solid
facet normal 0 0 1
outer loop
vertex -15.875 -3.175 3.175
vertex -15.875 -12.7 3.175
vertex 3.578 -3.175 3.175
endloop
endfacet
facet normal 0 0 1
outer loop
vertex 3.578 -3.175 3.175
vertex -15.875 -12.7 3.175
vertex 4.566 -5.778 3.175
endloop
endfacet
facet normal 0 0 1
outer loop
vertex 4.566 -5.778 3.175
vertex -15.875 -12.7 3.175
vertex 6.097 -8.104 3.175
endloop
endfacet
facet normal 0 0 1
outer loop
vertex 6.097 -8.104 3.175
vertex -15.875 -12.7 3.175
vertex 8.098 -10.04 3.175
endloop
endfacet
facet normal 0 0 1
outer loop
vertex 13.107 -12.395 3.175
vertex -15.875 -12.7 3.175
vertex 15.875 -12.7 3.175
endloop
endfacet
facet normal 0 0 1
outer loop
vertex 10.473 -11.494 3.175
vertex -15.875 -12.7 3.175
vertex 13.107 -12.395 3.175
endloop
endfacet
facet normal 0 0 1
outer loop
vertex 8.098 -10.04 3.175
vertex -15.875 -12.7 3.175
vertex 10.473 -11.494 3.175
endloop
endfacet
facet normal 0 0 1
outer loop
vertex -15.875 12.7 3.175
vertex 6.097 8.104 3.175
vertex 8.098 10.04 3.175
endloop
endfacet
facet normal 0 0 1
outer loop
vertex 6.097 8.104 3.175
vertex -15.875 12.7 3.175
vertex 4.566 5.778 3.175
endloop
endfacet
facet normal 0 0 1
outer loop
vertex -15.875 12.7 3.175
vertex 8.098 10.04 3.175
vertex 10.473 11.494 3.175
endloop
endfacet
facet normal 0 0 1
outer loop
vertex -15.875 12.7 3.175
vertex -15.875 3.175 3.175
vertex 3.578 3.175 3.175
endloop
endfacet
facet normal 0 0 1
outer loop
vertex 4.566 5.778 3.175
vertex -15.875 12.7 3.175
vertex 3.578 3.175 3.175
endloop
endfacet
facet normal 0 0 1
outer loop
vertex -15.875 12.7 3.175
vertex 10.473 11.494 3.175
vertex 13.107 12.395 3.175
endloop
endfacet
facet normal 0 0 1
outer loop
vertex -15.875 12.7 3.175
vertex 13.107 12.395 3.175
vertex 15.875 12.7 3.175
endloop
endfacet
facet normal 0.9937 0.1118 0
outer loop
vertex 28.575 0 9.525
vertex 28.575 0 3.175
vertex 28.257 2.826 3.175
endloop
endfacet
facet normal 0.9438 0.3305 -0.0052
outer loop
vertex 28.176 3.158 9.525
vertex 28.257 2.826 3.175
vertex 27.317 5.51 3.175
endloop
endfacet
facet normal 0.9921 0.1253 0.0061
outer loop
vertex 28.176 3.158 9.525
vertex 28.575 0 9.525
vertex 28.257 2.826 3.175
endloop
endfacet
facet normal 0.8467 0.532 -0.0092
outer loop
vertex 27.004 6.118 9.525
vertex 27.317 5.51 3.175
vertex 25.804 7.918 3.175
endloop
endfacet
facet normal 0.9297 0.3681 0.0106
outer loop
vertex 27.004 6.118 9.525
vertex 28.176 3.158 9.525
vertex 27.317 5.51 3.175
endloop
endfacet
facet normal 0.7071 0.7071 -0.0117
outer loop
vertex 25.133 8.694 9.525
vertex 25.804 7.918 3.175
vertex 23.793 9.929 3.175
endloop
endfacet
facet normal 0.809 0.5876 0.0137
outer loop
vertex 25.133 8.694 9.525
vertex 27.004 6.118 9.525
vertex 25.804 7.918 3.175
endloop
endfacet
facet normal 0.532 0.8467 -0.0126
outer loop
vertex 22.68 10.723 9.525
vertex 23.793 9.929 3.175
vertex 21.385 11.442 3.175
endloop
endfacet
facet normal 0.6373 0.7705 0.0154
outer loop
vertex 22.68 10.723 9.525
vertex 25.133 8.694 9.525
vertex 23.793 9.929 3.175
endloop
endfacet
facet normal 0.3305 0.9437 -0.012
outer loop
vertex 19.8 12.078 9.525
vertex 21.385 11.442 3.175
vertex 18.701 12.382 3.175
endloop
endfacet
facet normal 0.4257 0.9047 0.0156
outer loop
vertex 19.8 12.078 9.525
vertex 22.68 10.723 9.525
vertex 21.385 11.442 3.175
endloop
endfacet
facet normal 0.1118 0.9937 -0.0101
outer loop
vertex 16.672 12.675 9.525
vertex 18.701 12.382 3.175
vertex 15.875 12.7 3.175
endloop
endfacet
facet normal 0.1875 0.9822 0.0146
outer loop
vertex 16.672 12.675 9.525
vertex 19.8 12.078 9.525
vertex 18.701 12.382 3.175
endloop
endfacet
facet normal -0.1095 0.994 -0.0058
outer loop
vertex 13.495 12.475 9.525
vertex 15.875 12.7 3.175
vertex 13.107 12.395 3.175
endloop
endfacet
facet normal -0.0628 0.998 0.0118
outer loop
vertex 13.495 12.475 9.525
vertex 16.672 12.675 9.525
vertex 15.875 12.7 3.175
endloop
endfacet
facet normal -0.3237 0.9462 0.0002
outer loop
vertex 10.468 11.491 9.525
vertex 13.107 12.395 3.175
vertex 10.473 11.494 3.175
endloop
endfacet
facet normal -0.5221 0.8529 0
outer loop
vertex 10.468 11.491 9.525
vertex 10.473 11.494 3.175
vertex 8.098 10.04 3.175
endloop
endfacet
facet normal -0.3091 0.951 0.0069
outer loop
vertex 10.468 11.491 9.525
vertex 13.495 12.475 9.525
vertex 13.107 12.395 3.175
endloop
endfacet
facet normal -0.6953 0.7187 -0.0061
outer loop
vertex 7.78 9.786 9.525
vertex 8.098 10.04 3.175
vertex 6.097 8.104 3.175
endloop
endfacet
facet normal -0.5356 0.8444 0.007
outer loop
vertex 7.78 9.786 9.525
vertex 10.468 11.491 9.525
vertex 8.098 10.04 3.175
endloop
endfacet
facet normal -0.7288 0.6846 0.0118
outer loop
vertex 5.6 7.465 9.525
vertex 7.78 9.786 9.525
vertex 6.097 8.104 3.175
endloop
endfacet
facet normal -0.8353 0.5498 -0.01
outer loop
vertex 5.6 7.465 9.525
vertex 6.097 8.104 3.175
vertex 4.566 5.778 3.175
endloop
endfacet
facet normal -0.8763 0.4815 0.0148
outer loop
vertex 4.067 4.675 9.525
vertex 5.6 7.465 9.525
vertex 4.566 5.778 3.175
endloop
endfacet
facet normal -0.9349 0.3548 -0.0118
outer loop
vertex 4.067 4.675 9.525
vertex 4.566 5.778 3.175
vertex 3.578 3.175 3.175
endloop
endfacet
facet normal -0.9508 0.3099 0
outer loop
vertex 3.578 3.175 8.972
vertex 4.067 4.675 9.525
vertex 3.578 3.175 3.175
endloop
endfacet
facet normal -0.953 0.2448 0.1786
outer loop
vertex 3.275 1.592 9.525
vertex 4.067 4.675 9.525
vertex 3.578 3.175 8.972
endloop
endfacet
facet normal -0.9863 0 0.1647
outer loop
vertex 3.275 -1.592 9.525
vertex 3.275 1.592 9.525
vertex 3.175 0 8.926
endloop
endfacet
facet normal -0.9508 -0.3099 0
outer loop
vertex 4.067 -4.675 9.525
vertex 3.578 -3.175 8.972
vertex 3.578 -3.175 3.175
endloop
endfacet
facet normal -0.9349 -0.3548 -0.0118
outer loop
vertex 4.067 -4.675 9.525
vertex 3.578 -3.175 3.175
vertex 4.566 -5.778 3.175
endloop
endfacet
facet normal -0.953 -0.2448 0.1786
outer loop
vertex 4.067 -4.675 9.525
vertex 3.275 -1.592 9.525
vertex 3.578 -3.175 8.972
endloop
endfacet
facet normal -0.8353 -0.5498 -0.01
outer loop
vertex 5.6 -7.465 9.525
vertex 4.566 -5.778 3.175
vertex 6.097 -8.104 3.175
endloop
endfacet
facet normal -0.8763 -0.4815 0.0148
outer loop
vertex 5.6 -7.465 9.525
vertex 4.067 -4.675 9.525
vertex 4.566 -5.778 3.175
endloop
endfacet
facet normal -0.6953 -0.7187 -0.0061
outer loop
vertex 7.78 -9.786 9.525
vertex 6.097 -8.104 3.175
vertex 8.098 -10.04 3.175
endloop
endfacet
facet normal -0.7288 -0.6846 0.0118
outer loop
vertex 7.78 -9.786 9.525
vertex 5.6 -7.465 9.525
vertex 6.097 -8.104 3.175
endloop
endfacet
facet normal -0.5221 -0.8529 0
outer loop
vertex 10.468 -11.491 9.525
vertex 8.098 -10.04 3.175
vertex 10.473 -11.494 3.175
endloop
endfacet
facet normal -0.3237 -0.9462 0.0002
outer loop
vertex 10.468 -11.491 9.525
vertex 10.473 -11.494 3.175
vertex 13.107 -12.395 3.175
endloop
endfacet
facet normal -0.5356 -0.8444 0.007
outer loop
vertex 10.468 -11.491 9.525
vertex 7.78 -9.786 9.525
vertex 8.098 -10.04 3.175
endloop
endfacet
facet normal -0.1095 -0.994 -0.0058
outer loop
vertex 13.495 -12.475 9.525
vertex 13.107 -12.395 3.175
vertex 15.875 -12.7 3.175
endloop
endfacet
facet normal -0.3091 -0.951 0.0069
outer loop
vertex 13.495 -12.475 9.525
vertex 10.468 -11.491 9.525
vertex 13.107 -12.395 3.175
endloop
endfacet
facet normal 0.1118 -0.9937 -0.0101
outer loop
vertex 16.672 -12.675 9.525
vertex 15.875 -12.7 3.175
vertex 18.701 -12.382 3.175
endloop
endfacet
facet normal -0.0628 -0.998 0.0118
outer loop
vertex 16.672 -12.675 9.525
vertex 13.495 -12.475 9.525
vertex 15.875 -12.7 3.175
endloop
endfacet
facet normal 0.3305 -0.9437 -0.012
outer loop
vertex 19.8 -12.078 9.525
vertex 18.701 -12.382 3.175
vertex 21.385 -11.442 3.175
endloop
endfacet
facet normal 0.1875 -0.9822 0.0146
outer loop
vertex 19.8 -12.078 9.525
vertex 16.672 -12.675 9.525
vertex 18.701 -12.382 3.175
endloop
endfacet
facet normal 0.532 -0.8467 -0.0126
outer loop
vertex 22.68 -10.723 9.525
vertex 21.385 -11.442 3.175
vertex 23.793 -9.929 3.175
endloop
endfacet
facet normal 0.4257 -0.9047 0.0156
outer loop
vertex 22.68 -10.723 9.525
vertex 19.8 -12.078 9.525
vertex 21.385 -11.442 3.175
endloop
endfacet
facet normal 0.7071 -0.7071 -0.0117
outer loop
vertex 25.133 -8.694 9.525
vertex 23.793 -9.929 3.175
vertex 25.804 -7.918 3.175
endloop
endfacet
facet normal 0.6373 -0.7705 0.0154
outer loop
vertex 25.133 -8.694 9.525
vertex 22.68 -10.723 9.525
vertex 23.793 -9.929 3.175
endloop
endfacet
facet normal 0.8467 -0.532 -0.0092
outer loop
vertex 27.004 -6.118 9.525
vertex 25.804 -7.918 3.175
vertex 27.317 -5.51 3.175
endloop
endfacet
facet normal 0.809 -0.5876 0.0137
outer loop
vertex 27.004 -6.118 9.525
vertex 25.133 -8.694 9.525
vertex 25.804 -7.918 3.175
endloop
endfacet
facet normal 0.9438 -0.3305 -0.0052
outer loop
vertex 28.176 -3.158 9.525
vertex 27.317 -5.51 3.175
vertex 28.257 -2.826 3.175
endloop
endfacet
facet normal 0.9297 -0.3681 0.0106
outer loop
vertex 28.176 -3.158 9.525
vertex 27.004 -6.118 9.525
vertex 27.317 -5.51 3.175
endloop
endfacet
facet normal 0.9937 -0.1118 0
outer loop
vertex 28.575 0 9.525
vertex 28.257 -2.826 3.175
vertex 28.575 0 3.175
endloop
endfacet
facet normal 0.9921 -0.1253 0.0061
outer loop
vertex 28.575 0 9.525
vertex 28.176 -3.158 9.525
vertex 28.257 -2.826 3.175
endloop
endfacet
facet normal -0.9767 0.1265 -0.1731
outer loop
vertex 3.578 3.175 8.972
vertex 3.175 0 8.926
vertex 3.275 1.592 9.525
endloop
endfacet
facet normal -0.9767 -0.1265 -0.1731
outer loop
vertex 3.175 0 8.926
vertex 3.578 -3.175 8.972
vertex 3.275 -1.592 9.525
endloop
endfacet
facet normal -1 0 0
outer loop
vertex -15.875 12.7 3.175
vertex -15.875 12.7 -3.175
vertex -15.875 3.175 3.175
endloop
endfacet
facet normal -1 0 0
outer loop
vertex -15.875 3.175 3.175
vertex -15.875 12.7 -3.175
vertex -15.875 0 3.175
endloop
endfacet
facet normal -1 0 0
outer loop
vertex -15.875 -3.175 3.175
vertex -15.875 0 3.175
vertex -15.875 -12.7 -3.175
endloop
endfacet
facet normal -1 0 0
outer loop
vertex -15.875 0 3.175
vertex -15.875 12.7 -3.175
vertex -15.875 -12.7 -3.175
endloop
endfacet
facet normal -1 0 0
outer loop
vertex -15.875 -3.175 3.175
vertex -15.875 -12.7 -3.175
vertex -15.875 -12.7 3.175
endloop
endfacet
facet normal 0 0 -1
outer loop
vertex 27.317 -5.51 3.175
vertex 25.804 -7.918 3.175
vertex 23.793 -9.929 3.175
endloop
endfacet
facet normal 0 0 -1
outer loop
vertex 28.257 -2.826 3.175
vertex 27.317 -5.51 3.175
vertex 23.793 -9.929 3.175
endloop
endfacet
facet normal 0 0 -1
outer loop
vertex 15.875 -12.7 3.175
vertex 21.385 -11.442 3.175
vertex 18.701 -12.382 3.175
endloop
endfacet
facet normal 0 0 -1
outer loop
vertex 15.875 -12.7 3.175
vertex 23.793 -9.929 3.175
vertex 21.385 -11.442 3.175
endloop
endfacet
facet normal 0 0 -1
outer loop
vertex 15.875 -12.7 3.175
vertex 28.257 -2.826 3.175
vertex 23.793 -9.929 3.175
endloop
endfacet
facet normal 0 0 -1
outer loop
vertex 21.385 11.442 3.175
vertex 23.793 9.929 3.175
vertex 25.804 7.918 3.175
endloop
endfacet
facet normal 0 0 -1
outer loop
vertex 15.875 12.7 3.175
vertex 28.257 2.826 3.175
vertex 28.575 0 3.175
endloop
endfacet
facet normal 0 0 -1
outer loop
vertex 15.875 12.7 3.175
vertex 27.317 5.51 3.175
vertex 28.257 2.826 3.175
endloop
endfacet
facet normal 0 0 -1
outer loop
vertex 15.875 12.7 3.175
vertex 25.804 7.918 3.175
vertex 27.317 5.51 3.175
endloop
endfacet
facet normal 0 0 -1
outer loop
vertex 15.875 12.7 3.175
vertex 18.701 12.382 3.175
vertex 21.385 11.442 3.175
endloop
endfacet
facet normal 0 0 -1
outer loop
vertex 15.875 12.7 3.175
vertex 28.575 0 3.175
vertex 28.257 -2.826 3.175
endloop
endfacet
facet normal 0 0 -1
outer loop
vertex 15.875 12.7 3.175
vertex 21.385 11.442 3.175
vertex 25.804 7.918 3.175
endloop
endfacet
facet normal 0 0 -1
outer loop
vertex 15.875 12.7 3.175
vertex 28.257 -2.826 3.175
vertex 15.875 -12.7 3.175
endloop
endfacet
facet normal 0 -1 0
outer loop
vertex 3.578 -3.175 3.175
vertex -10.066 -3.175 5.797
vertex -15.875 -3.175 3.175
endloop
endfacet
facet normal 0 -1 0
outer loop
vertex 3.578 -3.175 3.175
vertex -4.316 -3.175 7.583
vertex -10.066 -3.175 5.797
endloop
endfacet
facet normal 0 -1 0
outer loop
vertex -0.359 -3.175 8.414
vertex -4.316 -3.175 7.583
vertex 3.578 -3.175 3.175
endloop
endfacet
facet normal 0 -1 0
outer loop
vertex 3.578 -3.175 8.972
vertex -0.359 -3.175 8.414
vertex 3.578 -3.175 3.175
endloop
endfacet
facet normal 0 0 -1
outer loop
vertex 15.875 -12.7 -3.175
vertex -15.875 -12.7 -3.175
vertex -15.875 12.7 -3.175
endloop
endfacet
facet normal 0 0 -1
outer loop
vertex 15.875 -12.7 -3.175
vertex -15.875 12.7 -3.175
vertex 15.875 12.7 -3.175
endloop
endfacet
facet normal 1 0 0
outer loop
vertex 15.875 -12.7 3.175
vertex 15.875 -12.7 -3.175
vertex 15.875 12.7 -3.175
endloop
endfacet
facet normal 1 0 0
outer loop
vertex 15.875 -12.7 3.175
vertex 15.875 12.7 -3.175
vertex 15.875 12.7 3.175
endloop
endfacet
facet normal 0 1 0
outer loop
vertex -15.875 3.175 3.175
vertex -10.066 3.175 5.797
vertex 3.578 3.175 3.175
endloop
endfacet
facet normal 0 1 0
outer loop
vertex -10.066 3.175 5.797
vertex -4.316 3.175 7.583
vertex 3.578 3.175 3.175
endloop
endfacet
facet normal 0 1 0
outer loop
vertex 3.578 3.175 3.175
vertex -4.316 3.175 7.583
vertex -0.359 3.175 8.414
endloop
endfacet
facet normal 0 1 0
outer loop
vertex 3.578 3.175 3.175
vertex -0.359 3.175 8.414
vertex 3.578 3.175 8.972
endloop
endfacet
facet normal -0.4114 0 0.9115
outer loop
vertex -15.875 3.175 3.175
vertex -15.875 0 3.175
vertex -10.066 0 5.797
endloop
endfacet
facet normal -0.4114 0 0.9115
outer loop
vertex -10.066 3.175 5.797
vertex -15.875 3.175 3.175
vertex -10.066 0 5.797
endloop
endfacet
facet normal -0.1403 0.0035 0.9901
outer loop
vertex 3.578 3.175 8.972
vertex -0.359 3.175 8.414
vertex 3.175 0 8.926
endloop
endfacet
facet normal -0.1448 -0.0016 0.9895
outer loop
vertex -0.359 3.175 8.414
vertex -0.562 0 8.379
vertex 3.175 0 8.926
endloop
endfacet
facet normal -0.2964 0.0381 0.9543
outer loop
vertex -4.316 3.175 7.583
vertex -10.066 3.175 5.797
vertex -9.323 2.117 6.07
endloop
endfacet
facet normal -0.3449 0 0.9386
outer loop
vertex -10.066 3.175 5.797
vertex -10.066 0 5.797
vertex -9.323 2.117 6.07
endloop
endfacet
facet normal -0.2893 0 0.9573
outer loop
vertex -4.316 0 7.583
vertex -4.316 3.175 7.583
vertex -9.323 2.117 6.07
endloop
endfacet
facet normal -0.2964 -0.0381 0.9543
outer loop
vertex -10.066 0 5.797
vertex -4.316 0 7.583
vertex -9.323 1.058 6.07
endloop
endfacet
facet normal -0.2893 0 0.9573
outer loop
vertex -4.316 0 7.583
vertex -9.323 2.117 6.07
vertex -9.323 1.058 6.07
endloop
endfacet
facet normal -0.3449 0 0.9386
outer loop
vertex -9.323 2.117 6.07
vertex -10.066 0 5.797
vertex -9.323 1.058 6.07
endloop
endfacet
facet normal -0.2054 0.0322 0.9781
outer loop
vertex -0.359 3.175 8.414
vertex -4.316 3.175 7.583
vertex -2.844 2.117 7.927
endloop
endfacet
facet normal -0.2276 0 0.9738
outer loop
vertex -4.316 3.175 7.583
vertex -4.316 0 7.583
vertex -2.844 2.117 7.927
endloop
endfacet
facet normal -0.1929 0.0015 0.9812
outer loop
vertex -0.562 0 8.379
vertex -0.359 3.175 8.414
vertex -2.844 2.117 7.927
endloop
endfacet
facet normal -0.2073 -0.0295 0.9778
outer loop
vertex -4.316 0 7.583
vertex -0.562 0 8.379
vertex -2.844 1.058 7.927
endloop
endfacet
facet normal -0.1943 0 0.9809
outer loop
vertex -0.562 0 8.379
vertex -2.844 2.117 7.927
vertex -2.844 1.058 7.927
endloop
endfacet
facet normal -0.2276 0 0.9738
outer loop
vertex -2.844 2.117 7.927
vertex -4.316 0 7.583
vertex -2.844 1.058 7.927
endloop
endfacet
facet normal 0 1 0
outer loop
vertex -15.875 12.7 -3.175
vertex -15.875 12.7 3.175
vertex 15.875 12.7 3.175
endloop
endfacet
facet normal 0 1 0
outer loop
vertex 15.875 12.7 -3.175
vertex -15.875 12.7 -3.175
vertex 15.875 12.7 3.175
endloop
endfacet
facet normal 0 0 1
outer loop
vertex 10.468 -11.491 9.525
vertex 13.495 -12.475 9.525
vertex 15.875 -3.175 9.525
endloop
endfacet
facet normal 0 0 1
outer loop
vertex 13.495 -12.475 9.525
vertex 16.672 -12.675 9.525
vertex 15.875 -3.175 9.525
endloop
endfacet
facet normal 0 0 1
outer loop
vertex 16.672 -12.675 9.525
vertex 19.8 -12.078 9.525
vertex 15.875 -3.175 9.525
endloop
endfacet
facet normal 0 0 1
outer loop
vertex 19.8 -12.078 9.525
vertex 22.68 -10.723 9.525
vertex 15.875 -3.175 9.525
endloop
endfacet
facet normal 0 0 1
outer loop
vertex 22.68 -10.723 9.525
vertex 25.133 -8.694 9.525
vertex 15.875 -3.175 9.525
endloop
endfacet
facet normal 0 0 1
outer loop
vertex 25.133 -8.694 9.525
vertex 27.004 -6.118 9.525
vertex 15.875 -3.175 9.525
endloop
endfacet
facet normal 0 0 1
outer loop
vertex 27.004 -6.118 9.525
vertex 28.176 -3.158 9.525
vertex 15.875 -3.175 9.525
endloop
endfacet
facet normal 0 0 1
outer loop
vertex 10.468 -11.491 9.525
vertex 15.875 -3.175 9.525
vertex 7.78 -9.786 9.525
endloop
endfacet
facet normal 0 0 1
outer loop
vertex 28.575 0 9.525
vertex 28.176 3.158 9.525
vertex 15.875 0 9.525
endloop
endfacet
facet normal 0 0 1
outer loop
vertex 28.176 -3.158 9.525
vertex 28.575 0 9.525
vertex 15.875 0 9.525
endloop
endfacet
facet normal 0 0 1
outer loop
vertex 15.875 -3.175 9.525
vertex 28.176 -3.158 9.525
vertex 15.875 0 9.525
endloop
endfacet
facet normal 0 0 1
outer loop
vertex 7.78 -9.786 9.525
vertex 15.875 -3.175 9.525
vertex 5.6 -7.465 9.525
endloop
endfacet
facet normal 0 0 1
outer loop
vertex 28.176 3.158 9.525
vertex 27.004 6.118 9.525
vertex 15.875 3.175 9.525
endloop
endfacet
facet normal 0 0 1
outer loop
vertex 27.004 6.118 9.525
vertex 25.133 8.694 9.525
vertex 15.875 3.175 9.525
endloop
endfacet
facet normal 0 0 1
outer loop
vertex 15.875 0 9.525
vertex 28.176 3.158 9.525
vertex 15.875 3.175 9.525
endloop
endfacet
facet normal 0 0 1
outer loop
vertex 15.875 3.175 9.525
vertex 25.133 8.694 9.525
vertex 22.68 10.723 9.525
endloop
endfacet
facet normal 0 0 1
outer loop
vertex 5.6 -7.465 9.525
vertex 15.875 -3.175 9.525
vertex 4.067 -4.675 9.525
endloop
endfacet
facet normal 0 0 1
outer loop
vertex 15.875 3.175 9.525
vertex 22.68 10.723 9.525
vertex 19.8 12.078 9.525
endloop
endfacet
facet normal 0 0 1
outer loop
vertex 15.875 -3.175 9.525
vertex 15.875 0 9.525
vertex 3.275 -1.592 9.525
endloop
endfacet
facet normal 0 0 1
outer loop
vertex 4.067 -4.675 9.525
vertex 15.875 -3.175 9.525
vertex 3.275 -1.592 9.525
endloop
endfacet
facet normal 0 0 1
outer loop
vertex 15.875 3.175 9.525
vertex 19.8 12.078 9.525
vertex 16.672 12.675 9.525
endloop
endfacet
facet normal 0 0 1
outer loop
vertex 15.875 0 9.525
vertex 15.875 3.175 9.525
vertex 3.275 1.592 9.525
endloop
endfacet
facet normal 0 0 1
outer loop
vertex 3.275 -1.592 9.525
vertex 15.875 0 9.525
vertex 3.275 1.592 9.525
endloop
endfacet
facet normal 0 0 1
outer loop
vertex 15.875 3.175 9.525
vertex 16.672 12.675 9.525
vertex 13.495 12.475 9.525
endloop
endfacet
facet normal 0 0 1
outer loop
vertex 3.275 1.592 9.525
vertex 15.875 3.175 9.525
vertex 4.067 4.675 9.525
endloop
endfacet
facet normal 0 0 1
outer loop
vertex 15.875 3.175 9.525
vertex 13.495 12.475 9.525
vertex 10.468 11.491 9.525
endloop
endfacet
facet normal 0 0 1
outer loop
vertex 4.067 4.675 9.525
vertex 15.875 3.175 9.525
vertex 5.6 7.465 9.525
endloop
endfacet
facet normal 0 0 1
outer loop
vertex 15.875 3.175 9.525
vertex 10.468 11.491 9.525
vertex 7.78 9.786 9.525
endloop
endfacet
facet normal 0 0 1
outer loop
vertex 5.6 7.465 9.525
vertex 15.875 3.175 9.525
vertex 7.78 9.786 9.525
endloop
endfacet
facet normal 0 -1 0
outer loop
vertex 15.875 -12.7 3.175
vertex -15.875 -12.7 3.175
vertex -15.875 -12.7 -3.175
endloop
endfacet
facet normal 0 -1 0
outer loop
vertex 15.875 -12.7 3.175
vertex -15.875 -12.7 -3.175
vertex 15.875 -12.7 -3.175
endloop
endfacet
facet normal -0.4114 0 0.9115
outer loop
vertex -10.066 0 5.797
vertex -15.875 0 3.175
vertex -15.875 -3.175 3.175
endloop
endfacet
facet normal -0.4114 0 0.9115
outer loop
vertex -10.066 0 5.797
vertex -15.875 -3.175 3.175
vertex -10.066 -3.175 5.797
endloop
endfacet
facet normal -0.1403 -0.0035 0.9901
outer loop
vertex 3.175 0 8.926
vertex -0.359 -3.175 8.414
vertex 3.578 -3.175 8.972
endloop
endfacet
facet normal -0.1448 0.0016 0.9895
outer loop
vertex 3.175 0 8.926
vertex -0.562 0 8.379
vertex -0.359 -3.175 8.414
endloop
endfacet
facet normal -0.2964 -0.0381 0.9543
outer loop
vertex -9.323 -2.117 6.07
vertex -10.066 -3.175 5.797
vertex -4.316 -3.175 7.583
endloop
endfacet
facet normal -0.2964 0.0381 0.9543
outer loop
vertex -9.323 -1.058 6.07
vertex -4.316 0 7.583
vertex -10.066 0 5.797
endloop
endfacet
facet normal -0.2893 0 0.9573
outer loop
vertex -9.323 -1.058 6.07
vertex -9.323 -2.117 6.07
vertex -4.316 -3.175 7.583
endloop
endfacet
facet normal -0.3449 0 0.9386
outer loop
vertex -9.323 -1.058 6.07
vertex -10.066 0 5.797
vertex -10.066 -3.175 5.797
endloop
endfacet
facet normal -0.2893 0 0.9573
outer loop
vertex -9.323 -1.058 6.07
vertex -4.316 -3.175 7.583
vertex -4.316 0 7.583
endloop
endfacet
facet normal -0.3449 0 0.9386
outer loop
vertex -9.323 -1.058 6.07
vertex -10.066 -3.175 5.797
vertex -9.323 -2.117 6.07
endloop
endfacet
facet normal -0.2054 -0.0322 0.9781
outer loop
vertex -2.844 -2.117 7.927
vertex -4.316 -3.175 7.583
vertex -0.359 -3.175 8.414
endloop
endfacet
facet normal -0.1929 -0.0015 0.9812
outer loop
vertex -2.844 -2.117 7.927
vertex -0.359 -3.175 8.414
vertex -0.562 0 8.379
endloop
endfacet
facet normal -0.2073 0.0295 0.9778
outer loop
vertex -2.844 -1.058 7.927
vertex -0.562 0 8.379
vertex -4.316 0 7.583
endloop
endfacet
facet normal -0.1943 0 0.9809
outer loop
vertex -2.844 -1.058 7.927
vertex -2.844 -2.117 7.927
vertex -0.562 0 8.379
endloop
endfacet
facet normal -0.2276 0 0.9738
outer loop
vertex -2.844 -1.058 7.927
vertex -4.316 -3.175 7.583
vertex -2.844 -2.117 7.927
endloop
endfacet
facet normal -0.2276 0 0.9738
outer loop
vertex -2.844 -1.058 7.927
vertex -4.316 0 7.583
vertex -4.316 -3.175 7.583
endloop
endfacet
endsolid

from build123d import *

# Parameters (mm, degrees)
F0_W     = 31.75
F0_H     = 6.35
F1_DEPTH = 12.7
F2_DEPTH = 3.175
F0_W_2   = 12.7


with BuildPart() as f1:
    # F0 (on Front) → F1 (new body, symmetric)
    with BuildSketch(Plane.XZ):
        Rectangle(F0_W, F0_H)
    extrude(amount=F1_DEPTH, both=True)

    # F0 (on Front) → F2 (join, symmetric)
    with BuildSketch(Plane.XZ):
        with BuildLine():
            Line((-15.875, 3.175), (15.875, 3.175))
            Line((15.875, 3.175), (15.875, 9.525))
            add(Edge.make_bspline(
                [(-15.875, 3.175), (-5.0392741859, 8.9093035005), (5.4355907996, 9.525), (15.875, 9.525)],
                knots=[0, 0, 0, 0, 32.3787739113, 32.3787739113, 32.3787739113, 32.3787739113], degree=3))
        make_face()
    extrude(amount=F2_DEPTH, both=True)

    # F0 (on Front) → F3 (revolve)
    with BuildSketch(Plane.XZ):
        with Locations((22.225, 6.35)):
            Rectangle(F0_W_2, F0_H)
    revolve(axis=Axis((15.875, 0, 6.35), (0, 0, 1)))


solid = f1.part
